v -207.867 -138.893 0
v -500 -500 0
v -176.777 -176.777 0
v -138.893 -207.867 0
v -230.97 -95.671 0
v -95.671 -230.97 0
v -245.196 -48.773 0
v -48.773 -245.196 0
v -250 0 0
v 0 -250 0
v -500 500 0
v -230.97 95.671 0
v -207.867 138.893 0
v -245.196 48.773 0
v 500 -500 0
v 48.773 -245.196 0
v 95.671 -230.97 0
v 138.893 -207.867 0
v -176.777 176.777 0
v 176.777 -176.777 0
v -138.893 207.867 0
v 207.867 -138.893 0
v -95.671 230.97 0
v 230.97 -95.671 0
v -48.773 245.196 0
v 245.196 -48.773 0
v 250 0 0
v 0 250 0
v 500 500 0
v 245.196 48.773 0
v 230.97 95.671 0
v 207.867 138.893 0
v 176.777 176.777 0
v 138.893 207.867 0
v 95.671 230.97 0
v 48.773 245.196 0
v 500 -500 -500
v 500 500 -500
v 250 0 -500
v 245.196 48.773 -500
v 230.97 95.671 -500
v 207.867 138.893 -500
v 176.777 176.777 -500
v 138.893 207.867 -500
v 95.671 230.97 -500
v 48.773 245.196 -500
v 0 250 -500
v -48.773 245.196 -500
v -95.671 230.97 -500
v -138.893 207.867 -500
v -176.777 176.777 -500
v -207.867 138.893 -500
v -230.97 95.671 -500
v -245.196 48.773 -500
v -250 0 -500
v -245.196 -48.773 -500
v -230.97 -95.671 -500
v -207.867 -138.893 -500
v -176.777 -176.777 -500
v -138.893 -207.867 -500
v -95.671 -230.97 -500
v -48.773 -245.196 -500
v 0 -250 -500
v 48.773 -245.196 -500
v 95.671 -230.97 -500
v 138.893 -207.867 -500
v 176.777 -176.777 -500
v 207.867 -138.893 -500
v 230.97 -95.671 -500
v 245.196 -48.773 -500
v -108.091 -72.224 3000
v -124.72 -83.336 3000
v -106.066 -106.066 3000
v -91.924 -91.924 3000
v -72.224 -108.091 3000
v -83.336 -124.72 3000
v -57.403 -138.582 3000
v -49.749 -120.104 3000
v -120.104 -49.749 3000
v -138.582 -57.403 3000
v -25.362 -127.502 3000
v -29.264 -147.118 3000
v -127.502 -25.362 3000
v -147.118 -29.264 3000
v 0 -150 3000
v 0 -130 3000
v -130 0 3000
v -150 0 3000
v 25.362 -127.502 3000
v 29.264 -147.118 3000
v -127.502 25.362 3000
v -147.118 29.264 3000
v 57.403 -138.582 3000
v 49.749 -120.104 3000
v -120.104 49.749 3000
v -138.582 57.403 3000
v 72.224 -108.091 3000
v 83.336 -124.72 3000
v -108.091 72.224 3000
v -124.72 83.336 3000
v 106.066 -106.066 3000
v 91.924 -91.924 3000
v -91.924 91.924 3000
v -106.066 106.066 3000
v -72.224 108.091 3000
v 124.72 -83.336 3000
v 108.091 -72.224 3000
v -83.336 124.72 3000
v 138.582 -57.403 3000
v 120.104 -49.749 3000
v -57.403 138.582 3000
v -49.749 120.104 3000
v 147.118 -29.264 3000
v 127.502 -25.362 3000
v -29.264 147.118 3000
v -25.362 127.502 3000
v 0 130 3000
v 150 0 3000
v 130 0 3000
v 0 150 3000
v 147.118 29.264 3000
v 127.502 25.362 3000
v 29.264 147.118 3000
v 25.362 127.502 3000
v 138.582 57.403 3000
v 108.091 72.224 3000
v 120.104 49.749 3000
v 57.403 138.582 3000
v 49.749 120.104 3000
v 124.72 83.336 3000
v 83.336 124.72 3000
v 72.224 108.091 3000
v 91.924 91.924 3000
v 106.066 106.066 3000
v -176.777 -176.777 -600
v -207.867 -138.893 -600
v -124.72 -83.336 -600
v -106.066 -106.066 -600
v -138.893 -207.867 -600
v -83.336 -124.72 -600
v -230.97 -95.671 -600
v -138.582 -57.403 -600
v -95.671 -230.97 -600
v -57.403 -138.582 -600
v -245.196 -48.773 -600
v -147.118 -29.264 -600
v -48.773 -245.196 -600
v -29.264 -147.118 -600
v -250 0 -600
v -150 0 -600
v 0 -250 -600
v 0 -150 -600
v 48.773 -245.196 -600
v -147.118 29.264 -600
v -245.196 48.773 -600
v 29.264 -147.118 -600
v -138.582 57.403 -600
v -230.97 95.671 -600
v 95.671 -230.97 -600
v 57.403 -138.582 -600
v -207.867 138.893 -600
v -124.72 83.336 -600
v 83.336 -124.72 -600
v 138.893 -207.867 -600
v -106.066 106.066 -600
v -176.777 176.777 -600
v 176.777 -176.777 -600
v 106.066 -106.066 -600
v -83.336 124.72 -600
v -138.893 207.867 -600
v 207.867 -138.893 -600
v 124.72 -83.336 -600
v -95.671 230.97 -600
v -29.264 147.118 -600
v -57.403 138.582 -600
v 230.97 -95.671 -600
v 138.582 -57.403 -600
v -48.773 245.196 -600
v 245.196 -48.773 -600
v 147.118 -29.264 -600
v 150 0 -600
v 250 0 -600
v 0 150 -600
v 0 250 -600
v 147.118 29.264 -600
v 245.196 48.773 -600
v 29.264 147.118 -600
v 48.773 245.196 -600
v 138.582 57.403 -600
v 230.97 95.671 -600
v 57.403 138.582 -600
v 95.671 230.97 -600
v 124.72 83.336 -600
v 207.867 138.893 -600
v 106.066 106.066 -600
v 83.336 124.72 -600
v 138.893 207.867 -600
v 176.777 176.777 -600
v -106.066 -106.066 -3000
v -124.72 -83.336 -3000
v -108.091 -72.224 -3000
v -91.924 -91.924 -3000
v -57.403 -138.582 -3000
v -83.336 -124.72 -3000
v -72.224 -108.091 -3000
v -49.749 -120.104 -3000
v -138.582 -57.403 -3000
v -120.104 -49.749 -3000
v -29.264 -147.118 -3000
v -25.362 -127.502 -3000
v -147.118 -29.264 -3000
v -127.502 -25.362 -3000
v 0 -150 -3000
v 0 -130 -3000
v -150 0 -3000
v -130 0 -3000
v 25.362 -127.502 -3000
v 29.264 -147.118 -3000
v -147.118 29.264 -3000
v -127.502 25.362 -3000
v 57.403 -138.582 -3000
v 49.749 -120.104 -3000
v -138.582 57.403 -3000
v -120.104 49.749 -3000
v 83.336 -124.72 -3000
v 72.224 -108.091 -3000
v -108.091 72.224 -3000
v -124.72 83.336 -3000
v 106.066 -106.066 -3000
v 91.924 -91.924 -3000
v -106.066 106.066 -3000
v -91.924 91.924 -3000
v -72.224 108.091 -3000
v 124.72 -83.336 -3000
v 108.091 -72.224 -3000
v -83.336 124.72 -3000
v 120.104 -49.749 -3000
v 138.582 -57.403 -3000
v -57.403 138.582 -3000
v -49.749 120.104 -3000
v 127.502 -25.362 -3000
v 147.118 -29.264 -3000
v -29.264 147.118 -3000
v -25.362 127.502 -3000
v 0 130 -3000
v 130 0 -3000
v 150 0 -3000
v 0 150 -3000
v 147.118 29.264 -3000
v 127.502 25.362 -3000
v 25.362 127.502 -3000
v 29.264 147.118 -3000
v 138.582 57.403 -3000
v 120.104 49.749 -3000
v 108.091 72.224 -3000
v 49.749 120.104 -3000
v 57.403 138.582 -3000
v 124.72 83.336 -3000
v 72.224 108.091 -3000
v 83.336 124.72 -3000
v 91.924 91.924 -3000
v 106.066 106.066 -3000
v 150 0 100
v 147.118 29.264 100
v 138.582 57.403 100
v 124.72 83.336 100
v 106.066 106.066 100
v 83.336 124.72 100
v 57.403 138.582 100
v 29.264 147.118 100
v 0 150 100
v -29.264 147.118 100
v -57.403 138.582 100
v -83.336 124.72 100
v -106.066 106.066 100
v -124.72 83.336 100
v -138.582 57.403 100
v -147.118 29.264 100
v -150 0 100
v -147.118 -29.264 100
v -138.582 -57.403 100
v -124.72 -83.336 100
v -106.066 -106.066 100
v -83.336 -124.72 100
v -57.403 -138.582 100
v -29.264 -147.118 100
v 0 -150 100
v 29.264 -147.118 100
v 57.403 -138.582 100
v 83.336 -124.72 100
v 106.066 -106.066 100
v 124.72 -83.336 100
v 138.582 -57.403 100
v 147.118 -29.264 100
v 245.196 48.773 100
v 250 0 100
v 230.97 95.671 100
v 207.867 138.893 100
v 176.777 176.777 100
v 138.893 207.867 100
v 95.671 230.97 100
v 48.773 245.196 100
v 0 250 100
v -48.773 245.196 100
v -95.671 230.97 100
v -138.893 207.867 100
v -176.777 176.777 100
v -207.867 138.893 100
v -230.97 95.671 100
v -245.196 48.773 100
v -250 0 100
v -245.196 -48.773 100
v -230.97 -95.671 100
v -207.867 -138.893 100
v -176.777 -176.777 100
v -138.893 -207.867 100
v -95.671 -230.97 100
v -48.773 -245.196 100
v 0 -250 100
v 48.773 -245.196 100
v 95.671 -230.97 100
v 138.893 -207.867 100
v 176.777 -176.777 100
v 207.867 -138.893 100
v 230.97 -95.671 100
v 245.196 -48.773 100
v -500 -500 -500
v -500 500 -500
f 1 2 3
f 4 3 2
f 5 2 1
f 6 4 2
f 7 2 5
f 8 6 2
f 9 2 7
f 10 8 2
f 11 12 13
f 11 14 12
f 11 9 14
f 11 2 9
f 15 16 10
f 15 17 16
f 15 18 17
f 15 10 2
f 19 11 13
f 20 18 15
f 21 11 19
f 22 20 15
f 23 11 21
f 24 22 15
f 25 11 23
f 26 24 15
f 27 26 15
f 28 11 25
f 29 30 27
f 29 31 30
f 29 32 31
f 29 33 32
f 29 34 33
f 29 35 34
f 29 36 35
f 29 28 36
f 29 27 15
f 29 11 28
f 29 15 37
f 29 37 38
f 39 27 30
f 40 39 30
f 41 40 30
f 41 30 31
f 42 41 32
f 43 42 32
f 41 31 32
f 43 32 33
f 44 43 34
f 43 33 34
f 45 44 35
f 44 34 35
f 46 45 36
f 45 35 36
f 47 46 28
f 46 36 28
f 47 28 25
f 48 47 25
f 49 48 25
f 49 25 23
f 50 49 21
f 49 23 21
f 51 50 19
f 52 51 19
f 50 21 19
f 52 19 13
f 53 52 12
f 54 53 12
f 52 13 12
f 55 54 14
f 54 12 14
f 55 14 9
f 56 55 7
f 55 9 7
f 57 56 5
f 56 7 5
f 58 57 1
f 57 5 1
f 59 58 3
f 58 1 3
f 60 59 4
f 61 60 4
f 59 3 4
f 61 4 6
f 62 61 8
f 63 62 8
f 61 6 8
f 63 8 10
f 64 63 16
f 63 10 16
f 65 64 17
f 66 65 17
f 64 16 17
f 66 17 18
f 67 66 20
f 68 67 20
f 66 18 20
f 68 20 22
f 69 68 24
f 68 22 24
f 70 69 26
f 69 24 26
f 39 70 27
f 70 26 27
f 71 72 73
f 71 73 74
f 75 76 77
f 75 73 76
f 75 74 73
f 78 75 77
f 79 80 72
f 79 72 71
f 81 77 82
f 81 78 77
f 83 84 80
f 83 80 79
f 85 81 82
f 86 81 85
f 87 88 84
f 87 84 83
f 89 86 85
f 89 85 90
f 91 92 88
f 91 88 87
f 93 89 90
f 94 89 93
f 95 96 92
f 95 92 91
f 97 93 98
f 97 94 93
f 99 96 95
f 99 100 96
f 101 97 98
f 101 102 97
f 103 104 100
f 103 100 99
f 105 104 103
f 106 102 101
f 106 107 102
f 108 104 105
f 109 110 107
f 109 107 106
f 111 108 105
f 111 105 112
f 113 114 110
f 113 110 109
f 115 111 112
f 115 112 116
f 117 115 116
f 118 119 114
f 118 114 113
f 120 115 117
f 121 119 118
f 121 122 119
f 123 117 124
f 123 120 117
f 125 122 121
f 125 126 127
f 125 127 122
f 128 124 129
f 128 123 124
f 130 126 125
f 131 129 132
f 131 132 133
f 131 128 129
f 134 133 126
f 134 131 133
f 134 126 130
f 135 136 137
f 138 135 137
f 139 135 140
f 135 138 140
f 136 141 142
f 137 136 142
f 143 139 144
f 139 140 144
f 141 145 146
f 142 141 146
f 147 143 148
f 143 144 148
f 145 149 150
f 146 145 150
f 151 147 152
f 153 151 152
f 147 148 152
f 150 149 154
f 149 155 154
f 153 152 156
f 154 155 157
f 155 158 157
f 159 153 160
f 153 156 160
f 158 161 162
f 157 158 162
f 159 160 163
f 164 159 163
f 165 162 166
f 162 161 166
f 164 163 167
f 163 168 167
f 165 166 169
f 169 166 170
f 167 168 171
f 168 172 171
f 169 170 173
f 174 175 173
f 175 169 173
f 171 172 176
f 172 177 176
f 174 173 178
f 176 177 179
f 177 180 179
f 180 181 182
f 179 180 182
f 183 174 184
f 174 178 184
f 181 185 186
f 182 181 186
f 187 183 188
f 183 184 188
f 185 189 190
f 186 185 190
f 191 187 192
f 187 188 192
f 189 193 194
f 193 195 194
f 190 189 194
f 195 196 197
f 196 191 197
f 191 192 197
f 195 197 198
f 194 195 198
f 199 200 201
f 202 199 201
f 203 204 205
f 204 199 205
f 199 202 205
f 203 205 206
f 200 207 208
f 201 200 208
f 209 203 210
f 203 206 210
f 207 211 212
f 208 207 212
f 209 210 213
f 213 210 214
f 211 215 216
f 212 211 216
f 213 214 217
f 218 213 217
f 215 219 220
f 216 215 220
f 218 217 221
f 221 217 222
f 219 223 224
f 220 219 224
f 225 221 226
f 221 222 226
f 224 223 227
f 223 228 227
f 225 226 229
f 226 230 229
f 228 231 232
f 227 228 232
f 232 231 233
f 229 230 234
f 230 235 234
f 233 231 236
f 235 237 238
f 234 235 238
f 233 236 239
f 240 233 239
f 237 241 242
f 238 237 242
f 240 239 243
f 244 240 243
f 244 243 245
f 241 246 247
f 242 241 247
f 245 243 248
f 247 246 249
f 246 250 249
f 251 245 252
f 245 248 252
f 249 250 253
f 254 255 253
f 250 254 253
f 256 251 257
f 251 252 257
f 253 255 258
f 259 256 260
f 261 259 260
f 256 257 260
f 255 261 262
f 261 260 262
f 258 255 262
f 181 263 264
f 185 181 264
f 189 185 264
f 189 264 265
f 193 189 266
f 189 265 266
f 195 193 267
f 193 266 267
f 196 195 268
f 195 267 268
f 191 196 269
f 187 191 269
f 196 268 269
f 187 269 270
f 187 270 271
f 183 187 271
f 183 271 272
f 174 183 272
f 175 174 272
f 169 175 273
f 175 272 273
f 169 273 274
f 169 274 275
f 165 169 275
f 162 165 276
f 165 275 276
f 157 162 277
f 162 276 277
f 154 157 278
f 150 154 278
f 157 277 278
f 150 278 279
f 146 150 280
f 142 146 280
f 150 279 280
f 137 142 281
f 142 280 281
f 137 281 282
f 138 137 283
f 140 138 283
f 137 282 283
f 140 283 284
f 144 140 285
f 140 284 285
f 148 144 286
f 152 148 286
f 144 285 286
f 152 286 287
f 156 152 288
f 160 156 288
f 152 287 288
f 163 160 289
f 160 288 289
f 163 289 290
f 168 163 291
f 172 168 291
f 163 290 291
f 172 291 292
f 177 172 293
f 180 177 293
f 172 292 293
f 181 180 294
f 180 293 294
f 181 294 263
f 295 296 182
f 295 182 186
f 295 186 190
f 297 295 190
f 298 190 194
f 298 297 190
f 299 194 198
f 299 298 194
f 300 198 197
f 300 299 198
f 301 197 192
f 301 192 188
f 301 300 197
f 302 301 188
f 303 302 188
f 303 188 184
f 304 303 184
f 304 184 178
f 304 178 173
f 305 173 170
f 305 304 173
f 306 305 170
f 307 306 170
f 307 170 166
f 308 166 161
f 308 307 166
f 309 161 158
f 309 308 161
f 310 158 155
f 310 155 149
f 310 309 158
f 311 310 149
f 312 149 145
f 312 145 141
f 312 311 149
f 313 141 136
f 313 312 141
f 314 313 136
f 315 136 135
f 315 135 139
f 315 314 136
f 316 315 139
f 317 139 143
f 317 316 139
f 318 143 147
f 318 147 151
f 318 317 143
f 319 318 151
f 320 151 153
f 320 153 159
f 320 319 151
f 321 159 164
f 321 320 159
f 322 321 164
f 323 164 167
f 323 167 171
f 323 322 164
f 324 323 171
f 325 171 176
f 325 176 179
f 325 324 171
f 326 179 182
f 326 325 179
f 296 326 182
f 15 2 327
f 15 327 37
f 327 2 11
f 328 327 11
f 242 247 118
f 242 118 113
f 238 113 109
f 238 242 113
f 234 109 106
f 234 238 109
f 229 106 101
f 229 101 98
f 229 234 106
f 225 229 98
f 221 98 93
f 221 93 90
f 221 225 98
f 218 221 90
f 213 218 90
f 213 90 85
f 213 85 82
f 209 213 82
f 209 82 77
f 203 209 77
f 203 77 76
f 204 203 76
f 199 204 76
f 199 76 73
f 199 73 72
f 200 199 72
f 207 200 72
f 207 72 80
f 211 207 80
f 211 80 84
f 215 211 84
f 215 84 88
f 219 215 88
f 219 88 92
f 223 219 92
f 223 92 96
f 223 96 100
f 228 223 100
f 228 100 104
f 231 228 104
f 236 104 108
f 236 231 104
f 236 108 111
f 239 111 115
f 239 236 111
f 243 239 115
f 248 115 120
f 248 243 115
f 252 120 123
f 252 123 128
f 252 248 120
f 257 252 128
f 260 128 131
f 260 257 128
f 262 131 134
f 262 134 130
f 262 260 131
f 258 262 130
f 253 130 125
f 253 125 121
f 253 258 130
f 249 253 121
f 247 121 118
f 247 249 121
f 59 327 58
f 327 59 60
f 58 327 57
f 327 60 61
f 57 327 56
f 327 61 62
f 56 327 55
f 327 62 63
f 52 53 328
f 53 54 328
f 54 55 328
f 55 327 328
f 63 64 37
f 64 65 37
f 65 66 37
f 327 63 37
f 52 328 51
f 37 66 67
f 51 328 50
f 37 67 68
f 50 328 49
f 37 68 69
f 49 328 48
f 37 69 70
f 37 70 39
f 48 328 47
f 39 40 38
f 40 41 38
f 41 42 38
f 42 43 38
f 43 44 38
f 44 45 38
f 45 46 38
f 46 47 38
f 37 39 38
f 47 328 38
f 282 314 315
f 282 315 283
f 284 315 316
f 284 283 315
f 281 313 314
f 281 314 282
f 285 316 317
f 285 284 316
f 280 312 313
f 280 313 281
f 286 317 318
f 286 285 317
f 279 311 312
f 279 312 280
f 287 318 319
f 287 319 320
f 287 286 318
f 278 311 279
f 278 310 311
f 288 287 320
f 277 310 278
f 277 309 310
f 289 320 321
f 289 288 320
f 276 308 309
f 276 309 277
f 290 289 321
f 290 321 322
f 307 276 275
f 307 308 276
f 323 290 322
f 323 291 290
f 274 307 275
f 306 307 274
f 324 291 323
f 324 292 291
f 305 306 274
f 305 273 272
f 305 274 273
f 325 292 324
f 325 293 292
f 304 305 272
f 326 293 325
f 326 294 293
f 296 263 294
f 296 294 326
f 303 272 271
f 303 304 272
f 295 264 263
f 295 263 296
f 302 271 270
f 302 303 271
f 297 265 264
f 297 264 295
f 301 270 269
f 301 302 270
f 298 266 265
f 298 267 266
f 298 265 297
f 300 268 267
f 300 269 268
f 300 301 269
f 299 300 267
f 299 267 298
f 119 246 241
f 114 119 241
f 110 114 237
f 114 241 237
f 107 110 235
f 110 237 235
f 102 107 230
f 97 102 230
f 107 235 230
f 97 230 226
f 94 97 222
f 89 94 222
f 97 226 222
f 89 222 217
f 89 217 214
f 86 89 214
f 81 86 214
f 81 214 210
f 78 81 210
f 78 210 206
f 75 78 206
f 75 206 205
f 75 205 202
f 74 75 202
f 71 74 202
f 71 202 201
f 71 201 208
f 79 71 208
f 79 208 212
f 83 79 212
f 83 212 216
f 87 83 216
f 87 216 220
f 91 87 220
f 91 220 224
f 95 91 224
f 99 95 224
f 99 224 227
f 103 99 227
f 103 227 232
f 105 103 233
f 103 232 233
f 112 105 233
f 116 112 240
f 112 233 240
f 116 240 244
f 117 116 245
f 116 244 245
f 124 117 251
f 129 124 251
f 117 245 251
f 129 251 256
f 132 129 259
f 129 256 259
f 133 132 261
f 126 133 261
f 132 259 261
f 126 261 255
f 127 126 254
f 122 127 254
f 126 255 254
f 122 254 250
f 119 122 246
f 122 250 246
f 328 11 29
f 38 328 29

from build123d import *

# Parameters (mm, degrees)
SKETCH1_W           = 1000
SKETCH1_H           = 1000
SKETCH1_R           = 250
BOSS_EXTRUDE1_DEPTH = 500
SKETCH4_R           = 150
SKETCH4_R_2         = 130
SKETCH8_R           = 250
SKETCH8_R_2         = 150
BOSS_EXTRUDE3_DEPTH = 700


with BuildPart() as part:
    # Sketch1 → Boss-Extrude1 (new body)
    with BuildSketch(Plane.XY):
        Rectangle(SKETCH1_W, SKETCH1_H)
        Circle(SKETCH1_R, mode=Mode.SUBTRACT)
    extrude(amount=-BOSS_EXTRUDE1_DEPTH)


with BuildPart() as body_2:
    # Sweep-Thin3: sweep along a path in Sketch6
    with BuildLine(Plane(origin=(0, 0, 0), x_dir=(1, 0, 0), z_dir=(0, 1, 0))) as sweep_thin3_path:
        Line((0, -3000), (0, 3000))
    # Sketch4 → Sweep-Thin3 (sweep)
    with BuildSketch(Plane.XY.offset(3000)):
        Circle(SKETCH4_R)
        Circle(SKETCH4_R_2, mode=Mode.SUBTRACT)
    sweep(path=sweep_thin3_path.line)


with BuildPart() as body_3:
    # Sketch8 → Boss-Extrude3 (new body)
    with BuildSketch(Plane.XY.offset(100)):
        Circle(SKETCH8_R)
        Circle(SKETCH8_R_2, mode=Mode.SUBTRACT)
    extrude(amount=-BOSS_EXTRUDE3_DEPTH)


solid = Compound([part.part, body_2.part, body_3.part])
